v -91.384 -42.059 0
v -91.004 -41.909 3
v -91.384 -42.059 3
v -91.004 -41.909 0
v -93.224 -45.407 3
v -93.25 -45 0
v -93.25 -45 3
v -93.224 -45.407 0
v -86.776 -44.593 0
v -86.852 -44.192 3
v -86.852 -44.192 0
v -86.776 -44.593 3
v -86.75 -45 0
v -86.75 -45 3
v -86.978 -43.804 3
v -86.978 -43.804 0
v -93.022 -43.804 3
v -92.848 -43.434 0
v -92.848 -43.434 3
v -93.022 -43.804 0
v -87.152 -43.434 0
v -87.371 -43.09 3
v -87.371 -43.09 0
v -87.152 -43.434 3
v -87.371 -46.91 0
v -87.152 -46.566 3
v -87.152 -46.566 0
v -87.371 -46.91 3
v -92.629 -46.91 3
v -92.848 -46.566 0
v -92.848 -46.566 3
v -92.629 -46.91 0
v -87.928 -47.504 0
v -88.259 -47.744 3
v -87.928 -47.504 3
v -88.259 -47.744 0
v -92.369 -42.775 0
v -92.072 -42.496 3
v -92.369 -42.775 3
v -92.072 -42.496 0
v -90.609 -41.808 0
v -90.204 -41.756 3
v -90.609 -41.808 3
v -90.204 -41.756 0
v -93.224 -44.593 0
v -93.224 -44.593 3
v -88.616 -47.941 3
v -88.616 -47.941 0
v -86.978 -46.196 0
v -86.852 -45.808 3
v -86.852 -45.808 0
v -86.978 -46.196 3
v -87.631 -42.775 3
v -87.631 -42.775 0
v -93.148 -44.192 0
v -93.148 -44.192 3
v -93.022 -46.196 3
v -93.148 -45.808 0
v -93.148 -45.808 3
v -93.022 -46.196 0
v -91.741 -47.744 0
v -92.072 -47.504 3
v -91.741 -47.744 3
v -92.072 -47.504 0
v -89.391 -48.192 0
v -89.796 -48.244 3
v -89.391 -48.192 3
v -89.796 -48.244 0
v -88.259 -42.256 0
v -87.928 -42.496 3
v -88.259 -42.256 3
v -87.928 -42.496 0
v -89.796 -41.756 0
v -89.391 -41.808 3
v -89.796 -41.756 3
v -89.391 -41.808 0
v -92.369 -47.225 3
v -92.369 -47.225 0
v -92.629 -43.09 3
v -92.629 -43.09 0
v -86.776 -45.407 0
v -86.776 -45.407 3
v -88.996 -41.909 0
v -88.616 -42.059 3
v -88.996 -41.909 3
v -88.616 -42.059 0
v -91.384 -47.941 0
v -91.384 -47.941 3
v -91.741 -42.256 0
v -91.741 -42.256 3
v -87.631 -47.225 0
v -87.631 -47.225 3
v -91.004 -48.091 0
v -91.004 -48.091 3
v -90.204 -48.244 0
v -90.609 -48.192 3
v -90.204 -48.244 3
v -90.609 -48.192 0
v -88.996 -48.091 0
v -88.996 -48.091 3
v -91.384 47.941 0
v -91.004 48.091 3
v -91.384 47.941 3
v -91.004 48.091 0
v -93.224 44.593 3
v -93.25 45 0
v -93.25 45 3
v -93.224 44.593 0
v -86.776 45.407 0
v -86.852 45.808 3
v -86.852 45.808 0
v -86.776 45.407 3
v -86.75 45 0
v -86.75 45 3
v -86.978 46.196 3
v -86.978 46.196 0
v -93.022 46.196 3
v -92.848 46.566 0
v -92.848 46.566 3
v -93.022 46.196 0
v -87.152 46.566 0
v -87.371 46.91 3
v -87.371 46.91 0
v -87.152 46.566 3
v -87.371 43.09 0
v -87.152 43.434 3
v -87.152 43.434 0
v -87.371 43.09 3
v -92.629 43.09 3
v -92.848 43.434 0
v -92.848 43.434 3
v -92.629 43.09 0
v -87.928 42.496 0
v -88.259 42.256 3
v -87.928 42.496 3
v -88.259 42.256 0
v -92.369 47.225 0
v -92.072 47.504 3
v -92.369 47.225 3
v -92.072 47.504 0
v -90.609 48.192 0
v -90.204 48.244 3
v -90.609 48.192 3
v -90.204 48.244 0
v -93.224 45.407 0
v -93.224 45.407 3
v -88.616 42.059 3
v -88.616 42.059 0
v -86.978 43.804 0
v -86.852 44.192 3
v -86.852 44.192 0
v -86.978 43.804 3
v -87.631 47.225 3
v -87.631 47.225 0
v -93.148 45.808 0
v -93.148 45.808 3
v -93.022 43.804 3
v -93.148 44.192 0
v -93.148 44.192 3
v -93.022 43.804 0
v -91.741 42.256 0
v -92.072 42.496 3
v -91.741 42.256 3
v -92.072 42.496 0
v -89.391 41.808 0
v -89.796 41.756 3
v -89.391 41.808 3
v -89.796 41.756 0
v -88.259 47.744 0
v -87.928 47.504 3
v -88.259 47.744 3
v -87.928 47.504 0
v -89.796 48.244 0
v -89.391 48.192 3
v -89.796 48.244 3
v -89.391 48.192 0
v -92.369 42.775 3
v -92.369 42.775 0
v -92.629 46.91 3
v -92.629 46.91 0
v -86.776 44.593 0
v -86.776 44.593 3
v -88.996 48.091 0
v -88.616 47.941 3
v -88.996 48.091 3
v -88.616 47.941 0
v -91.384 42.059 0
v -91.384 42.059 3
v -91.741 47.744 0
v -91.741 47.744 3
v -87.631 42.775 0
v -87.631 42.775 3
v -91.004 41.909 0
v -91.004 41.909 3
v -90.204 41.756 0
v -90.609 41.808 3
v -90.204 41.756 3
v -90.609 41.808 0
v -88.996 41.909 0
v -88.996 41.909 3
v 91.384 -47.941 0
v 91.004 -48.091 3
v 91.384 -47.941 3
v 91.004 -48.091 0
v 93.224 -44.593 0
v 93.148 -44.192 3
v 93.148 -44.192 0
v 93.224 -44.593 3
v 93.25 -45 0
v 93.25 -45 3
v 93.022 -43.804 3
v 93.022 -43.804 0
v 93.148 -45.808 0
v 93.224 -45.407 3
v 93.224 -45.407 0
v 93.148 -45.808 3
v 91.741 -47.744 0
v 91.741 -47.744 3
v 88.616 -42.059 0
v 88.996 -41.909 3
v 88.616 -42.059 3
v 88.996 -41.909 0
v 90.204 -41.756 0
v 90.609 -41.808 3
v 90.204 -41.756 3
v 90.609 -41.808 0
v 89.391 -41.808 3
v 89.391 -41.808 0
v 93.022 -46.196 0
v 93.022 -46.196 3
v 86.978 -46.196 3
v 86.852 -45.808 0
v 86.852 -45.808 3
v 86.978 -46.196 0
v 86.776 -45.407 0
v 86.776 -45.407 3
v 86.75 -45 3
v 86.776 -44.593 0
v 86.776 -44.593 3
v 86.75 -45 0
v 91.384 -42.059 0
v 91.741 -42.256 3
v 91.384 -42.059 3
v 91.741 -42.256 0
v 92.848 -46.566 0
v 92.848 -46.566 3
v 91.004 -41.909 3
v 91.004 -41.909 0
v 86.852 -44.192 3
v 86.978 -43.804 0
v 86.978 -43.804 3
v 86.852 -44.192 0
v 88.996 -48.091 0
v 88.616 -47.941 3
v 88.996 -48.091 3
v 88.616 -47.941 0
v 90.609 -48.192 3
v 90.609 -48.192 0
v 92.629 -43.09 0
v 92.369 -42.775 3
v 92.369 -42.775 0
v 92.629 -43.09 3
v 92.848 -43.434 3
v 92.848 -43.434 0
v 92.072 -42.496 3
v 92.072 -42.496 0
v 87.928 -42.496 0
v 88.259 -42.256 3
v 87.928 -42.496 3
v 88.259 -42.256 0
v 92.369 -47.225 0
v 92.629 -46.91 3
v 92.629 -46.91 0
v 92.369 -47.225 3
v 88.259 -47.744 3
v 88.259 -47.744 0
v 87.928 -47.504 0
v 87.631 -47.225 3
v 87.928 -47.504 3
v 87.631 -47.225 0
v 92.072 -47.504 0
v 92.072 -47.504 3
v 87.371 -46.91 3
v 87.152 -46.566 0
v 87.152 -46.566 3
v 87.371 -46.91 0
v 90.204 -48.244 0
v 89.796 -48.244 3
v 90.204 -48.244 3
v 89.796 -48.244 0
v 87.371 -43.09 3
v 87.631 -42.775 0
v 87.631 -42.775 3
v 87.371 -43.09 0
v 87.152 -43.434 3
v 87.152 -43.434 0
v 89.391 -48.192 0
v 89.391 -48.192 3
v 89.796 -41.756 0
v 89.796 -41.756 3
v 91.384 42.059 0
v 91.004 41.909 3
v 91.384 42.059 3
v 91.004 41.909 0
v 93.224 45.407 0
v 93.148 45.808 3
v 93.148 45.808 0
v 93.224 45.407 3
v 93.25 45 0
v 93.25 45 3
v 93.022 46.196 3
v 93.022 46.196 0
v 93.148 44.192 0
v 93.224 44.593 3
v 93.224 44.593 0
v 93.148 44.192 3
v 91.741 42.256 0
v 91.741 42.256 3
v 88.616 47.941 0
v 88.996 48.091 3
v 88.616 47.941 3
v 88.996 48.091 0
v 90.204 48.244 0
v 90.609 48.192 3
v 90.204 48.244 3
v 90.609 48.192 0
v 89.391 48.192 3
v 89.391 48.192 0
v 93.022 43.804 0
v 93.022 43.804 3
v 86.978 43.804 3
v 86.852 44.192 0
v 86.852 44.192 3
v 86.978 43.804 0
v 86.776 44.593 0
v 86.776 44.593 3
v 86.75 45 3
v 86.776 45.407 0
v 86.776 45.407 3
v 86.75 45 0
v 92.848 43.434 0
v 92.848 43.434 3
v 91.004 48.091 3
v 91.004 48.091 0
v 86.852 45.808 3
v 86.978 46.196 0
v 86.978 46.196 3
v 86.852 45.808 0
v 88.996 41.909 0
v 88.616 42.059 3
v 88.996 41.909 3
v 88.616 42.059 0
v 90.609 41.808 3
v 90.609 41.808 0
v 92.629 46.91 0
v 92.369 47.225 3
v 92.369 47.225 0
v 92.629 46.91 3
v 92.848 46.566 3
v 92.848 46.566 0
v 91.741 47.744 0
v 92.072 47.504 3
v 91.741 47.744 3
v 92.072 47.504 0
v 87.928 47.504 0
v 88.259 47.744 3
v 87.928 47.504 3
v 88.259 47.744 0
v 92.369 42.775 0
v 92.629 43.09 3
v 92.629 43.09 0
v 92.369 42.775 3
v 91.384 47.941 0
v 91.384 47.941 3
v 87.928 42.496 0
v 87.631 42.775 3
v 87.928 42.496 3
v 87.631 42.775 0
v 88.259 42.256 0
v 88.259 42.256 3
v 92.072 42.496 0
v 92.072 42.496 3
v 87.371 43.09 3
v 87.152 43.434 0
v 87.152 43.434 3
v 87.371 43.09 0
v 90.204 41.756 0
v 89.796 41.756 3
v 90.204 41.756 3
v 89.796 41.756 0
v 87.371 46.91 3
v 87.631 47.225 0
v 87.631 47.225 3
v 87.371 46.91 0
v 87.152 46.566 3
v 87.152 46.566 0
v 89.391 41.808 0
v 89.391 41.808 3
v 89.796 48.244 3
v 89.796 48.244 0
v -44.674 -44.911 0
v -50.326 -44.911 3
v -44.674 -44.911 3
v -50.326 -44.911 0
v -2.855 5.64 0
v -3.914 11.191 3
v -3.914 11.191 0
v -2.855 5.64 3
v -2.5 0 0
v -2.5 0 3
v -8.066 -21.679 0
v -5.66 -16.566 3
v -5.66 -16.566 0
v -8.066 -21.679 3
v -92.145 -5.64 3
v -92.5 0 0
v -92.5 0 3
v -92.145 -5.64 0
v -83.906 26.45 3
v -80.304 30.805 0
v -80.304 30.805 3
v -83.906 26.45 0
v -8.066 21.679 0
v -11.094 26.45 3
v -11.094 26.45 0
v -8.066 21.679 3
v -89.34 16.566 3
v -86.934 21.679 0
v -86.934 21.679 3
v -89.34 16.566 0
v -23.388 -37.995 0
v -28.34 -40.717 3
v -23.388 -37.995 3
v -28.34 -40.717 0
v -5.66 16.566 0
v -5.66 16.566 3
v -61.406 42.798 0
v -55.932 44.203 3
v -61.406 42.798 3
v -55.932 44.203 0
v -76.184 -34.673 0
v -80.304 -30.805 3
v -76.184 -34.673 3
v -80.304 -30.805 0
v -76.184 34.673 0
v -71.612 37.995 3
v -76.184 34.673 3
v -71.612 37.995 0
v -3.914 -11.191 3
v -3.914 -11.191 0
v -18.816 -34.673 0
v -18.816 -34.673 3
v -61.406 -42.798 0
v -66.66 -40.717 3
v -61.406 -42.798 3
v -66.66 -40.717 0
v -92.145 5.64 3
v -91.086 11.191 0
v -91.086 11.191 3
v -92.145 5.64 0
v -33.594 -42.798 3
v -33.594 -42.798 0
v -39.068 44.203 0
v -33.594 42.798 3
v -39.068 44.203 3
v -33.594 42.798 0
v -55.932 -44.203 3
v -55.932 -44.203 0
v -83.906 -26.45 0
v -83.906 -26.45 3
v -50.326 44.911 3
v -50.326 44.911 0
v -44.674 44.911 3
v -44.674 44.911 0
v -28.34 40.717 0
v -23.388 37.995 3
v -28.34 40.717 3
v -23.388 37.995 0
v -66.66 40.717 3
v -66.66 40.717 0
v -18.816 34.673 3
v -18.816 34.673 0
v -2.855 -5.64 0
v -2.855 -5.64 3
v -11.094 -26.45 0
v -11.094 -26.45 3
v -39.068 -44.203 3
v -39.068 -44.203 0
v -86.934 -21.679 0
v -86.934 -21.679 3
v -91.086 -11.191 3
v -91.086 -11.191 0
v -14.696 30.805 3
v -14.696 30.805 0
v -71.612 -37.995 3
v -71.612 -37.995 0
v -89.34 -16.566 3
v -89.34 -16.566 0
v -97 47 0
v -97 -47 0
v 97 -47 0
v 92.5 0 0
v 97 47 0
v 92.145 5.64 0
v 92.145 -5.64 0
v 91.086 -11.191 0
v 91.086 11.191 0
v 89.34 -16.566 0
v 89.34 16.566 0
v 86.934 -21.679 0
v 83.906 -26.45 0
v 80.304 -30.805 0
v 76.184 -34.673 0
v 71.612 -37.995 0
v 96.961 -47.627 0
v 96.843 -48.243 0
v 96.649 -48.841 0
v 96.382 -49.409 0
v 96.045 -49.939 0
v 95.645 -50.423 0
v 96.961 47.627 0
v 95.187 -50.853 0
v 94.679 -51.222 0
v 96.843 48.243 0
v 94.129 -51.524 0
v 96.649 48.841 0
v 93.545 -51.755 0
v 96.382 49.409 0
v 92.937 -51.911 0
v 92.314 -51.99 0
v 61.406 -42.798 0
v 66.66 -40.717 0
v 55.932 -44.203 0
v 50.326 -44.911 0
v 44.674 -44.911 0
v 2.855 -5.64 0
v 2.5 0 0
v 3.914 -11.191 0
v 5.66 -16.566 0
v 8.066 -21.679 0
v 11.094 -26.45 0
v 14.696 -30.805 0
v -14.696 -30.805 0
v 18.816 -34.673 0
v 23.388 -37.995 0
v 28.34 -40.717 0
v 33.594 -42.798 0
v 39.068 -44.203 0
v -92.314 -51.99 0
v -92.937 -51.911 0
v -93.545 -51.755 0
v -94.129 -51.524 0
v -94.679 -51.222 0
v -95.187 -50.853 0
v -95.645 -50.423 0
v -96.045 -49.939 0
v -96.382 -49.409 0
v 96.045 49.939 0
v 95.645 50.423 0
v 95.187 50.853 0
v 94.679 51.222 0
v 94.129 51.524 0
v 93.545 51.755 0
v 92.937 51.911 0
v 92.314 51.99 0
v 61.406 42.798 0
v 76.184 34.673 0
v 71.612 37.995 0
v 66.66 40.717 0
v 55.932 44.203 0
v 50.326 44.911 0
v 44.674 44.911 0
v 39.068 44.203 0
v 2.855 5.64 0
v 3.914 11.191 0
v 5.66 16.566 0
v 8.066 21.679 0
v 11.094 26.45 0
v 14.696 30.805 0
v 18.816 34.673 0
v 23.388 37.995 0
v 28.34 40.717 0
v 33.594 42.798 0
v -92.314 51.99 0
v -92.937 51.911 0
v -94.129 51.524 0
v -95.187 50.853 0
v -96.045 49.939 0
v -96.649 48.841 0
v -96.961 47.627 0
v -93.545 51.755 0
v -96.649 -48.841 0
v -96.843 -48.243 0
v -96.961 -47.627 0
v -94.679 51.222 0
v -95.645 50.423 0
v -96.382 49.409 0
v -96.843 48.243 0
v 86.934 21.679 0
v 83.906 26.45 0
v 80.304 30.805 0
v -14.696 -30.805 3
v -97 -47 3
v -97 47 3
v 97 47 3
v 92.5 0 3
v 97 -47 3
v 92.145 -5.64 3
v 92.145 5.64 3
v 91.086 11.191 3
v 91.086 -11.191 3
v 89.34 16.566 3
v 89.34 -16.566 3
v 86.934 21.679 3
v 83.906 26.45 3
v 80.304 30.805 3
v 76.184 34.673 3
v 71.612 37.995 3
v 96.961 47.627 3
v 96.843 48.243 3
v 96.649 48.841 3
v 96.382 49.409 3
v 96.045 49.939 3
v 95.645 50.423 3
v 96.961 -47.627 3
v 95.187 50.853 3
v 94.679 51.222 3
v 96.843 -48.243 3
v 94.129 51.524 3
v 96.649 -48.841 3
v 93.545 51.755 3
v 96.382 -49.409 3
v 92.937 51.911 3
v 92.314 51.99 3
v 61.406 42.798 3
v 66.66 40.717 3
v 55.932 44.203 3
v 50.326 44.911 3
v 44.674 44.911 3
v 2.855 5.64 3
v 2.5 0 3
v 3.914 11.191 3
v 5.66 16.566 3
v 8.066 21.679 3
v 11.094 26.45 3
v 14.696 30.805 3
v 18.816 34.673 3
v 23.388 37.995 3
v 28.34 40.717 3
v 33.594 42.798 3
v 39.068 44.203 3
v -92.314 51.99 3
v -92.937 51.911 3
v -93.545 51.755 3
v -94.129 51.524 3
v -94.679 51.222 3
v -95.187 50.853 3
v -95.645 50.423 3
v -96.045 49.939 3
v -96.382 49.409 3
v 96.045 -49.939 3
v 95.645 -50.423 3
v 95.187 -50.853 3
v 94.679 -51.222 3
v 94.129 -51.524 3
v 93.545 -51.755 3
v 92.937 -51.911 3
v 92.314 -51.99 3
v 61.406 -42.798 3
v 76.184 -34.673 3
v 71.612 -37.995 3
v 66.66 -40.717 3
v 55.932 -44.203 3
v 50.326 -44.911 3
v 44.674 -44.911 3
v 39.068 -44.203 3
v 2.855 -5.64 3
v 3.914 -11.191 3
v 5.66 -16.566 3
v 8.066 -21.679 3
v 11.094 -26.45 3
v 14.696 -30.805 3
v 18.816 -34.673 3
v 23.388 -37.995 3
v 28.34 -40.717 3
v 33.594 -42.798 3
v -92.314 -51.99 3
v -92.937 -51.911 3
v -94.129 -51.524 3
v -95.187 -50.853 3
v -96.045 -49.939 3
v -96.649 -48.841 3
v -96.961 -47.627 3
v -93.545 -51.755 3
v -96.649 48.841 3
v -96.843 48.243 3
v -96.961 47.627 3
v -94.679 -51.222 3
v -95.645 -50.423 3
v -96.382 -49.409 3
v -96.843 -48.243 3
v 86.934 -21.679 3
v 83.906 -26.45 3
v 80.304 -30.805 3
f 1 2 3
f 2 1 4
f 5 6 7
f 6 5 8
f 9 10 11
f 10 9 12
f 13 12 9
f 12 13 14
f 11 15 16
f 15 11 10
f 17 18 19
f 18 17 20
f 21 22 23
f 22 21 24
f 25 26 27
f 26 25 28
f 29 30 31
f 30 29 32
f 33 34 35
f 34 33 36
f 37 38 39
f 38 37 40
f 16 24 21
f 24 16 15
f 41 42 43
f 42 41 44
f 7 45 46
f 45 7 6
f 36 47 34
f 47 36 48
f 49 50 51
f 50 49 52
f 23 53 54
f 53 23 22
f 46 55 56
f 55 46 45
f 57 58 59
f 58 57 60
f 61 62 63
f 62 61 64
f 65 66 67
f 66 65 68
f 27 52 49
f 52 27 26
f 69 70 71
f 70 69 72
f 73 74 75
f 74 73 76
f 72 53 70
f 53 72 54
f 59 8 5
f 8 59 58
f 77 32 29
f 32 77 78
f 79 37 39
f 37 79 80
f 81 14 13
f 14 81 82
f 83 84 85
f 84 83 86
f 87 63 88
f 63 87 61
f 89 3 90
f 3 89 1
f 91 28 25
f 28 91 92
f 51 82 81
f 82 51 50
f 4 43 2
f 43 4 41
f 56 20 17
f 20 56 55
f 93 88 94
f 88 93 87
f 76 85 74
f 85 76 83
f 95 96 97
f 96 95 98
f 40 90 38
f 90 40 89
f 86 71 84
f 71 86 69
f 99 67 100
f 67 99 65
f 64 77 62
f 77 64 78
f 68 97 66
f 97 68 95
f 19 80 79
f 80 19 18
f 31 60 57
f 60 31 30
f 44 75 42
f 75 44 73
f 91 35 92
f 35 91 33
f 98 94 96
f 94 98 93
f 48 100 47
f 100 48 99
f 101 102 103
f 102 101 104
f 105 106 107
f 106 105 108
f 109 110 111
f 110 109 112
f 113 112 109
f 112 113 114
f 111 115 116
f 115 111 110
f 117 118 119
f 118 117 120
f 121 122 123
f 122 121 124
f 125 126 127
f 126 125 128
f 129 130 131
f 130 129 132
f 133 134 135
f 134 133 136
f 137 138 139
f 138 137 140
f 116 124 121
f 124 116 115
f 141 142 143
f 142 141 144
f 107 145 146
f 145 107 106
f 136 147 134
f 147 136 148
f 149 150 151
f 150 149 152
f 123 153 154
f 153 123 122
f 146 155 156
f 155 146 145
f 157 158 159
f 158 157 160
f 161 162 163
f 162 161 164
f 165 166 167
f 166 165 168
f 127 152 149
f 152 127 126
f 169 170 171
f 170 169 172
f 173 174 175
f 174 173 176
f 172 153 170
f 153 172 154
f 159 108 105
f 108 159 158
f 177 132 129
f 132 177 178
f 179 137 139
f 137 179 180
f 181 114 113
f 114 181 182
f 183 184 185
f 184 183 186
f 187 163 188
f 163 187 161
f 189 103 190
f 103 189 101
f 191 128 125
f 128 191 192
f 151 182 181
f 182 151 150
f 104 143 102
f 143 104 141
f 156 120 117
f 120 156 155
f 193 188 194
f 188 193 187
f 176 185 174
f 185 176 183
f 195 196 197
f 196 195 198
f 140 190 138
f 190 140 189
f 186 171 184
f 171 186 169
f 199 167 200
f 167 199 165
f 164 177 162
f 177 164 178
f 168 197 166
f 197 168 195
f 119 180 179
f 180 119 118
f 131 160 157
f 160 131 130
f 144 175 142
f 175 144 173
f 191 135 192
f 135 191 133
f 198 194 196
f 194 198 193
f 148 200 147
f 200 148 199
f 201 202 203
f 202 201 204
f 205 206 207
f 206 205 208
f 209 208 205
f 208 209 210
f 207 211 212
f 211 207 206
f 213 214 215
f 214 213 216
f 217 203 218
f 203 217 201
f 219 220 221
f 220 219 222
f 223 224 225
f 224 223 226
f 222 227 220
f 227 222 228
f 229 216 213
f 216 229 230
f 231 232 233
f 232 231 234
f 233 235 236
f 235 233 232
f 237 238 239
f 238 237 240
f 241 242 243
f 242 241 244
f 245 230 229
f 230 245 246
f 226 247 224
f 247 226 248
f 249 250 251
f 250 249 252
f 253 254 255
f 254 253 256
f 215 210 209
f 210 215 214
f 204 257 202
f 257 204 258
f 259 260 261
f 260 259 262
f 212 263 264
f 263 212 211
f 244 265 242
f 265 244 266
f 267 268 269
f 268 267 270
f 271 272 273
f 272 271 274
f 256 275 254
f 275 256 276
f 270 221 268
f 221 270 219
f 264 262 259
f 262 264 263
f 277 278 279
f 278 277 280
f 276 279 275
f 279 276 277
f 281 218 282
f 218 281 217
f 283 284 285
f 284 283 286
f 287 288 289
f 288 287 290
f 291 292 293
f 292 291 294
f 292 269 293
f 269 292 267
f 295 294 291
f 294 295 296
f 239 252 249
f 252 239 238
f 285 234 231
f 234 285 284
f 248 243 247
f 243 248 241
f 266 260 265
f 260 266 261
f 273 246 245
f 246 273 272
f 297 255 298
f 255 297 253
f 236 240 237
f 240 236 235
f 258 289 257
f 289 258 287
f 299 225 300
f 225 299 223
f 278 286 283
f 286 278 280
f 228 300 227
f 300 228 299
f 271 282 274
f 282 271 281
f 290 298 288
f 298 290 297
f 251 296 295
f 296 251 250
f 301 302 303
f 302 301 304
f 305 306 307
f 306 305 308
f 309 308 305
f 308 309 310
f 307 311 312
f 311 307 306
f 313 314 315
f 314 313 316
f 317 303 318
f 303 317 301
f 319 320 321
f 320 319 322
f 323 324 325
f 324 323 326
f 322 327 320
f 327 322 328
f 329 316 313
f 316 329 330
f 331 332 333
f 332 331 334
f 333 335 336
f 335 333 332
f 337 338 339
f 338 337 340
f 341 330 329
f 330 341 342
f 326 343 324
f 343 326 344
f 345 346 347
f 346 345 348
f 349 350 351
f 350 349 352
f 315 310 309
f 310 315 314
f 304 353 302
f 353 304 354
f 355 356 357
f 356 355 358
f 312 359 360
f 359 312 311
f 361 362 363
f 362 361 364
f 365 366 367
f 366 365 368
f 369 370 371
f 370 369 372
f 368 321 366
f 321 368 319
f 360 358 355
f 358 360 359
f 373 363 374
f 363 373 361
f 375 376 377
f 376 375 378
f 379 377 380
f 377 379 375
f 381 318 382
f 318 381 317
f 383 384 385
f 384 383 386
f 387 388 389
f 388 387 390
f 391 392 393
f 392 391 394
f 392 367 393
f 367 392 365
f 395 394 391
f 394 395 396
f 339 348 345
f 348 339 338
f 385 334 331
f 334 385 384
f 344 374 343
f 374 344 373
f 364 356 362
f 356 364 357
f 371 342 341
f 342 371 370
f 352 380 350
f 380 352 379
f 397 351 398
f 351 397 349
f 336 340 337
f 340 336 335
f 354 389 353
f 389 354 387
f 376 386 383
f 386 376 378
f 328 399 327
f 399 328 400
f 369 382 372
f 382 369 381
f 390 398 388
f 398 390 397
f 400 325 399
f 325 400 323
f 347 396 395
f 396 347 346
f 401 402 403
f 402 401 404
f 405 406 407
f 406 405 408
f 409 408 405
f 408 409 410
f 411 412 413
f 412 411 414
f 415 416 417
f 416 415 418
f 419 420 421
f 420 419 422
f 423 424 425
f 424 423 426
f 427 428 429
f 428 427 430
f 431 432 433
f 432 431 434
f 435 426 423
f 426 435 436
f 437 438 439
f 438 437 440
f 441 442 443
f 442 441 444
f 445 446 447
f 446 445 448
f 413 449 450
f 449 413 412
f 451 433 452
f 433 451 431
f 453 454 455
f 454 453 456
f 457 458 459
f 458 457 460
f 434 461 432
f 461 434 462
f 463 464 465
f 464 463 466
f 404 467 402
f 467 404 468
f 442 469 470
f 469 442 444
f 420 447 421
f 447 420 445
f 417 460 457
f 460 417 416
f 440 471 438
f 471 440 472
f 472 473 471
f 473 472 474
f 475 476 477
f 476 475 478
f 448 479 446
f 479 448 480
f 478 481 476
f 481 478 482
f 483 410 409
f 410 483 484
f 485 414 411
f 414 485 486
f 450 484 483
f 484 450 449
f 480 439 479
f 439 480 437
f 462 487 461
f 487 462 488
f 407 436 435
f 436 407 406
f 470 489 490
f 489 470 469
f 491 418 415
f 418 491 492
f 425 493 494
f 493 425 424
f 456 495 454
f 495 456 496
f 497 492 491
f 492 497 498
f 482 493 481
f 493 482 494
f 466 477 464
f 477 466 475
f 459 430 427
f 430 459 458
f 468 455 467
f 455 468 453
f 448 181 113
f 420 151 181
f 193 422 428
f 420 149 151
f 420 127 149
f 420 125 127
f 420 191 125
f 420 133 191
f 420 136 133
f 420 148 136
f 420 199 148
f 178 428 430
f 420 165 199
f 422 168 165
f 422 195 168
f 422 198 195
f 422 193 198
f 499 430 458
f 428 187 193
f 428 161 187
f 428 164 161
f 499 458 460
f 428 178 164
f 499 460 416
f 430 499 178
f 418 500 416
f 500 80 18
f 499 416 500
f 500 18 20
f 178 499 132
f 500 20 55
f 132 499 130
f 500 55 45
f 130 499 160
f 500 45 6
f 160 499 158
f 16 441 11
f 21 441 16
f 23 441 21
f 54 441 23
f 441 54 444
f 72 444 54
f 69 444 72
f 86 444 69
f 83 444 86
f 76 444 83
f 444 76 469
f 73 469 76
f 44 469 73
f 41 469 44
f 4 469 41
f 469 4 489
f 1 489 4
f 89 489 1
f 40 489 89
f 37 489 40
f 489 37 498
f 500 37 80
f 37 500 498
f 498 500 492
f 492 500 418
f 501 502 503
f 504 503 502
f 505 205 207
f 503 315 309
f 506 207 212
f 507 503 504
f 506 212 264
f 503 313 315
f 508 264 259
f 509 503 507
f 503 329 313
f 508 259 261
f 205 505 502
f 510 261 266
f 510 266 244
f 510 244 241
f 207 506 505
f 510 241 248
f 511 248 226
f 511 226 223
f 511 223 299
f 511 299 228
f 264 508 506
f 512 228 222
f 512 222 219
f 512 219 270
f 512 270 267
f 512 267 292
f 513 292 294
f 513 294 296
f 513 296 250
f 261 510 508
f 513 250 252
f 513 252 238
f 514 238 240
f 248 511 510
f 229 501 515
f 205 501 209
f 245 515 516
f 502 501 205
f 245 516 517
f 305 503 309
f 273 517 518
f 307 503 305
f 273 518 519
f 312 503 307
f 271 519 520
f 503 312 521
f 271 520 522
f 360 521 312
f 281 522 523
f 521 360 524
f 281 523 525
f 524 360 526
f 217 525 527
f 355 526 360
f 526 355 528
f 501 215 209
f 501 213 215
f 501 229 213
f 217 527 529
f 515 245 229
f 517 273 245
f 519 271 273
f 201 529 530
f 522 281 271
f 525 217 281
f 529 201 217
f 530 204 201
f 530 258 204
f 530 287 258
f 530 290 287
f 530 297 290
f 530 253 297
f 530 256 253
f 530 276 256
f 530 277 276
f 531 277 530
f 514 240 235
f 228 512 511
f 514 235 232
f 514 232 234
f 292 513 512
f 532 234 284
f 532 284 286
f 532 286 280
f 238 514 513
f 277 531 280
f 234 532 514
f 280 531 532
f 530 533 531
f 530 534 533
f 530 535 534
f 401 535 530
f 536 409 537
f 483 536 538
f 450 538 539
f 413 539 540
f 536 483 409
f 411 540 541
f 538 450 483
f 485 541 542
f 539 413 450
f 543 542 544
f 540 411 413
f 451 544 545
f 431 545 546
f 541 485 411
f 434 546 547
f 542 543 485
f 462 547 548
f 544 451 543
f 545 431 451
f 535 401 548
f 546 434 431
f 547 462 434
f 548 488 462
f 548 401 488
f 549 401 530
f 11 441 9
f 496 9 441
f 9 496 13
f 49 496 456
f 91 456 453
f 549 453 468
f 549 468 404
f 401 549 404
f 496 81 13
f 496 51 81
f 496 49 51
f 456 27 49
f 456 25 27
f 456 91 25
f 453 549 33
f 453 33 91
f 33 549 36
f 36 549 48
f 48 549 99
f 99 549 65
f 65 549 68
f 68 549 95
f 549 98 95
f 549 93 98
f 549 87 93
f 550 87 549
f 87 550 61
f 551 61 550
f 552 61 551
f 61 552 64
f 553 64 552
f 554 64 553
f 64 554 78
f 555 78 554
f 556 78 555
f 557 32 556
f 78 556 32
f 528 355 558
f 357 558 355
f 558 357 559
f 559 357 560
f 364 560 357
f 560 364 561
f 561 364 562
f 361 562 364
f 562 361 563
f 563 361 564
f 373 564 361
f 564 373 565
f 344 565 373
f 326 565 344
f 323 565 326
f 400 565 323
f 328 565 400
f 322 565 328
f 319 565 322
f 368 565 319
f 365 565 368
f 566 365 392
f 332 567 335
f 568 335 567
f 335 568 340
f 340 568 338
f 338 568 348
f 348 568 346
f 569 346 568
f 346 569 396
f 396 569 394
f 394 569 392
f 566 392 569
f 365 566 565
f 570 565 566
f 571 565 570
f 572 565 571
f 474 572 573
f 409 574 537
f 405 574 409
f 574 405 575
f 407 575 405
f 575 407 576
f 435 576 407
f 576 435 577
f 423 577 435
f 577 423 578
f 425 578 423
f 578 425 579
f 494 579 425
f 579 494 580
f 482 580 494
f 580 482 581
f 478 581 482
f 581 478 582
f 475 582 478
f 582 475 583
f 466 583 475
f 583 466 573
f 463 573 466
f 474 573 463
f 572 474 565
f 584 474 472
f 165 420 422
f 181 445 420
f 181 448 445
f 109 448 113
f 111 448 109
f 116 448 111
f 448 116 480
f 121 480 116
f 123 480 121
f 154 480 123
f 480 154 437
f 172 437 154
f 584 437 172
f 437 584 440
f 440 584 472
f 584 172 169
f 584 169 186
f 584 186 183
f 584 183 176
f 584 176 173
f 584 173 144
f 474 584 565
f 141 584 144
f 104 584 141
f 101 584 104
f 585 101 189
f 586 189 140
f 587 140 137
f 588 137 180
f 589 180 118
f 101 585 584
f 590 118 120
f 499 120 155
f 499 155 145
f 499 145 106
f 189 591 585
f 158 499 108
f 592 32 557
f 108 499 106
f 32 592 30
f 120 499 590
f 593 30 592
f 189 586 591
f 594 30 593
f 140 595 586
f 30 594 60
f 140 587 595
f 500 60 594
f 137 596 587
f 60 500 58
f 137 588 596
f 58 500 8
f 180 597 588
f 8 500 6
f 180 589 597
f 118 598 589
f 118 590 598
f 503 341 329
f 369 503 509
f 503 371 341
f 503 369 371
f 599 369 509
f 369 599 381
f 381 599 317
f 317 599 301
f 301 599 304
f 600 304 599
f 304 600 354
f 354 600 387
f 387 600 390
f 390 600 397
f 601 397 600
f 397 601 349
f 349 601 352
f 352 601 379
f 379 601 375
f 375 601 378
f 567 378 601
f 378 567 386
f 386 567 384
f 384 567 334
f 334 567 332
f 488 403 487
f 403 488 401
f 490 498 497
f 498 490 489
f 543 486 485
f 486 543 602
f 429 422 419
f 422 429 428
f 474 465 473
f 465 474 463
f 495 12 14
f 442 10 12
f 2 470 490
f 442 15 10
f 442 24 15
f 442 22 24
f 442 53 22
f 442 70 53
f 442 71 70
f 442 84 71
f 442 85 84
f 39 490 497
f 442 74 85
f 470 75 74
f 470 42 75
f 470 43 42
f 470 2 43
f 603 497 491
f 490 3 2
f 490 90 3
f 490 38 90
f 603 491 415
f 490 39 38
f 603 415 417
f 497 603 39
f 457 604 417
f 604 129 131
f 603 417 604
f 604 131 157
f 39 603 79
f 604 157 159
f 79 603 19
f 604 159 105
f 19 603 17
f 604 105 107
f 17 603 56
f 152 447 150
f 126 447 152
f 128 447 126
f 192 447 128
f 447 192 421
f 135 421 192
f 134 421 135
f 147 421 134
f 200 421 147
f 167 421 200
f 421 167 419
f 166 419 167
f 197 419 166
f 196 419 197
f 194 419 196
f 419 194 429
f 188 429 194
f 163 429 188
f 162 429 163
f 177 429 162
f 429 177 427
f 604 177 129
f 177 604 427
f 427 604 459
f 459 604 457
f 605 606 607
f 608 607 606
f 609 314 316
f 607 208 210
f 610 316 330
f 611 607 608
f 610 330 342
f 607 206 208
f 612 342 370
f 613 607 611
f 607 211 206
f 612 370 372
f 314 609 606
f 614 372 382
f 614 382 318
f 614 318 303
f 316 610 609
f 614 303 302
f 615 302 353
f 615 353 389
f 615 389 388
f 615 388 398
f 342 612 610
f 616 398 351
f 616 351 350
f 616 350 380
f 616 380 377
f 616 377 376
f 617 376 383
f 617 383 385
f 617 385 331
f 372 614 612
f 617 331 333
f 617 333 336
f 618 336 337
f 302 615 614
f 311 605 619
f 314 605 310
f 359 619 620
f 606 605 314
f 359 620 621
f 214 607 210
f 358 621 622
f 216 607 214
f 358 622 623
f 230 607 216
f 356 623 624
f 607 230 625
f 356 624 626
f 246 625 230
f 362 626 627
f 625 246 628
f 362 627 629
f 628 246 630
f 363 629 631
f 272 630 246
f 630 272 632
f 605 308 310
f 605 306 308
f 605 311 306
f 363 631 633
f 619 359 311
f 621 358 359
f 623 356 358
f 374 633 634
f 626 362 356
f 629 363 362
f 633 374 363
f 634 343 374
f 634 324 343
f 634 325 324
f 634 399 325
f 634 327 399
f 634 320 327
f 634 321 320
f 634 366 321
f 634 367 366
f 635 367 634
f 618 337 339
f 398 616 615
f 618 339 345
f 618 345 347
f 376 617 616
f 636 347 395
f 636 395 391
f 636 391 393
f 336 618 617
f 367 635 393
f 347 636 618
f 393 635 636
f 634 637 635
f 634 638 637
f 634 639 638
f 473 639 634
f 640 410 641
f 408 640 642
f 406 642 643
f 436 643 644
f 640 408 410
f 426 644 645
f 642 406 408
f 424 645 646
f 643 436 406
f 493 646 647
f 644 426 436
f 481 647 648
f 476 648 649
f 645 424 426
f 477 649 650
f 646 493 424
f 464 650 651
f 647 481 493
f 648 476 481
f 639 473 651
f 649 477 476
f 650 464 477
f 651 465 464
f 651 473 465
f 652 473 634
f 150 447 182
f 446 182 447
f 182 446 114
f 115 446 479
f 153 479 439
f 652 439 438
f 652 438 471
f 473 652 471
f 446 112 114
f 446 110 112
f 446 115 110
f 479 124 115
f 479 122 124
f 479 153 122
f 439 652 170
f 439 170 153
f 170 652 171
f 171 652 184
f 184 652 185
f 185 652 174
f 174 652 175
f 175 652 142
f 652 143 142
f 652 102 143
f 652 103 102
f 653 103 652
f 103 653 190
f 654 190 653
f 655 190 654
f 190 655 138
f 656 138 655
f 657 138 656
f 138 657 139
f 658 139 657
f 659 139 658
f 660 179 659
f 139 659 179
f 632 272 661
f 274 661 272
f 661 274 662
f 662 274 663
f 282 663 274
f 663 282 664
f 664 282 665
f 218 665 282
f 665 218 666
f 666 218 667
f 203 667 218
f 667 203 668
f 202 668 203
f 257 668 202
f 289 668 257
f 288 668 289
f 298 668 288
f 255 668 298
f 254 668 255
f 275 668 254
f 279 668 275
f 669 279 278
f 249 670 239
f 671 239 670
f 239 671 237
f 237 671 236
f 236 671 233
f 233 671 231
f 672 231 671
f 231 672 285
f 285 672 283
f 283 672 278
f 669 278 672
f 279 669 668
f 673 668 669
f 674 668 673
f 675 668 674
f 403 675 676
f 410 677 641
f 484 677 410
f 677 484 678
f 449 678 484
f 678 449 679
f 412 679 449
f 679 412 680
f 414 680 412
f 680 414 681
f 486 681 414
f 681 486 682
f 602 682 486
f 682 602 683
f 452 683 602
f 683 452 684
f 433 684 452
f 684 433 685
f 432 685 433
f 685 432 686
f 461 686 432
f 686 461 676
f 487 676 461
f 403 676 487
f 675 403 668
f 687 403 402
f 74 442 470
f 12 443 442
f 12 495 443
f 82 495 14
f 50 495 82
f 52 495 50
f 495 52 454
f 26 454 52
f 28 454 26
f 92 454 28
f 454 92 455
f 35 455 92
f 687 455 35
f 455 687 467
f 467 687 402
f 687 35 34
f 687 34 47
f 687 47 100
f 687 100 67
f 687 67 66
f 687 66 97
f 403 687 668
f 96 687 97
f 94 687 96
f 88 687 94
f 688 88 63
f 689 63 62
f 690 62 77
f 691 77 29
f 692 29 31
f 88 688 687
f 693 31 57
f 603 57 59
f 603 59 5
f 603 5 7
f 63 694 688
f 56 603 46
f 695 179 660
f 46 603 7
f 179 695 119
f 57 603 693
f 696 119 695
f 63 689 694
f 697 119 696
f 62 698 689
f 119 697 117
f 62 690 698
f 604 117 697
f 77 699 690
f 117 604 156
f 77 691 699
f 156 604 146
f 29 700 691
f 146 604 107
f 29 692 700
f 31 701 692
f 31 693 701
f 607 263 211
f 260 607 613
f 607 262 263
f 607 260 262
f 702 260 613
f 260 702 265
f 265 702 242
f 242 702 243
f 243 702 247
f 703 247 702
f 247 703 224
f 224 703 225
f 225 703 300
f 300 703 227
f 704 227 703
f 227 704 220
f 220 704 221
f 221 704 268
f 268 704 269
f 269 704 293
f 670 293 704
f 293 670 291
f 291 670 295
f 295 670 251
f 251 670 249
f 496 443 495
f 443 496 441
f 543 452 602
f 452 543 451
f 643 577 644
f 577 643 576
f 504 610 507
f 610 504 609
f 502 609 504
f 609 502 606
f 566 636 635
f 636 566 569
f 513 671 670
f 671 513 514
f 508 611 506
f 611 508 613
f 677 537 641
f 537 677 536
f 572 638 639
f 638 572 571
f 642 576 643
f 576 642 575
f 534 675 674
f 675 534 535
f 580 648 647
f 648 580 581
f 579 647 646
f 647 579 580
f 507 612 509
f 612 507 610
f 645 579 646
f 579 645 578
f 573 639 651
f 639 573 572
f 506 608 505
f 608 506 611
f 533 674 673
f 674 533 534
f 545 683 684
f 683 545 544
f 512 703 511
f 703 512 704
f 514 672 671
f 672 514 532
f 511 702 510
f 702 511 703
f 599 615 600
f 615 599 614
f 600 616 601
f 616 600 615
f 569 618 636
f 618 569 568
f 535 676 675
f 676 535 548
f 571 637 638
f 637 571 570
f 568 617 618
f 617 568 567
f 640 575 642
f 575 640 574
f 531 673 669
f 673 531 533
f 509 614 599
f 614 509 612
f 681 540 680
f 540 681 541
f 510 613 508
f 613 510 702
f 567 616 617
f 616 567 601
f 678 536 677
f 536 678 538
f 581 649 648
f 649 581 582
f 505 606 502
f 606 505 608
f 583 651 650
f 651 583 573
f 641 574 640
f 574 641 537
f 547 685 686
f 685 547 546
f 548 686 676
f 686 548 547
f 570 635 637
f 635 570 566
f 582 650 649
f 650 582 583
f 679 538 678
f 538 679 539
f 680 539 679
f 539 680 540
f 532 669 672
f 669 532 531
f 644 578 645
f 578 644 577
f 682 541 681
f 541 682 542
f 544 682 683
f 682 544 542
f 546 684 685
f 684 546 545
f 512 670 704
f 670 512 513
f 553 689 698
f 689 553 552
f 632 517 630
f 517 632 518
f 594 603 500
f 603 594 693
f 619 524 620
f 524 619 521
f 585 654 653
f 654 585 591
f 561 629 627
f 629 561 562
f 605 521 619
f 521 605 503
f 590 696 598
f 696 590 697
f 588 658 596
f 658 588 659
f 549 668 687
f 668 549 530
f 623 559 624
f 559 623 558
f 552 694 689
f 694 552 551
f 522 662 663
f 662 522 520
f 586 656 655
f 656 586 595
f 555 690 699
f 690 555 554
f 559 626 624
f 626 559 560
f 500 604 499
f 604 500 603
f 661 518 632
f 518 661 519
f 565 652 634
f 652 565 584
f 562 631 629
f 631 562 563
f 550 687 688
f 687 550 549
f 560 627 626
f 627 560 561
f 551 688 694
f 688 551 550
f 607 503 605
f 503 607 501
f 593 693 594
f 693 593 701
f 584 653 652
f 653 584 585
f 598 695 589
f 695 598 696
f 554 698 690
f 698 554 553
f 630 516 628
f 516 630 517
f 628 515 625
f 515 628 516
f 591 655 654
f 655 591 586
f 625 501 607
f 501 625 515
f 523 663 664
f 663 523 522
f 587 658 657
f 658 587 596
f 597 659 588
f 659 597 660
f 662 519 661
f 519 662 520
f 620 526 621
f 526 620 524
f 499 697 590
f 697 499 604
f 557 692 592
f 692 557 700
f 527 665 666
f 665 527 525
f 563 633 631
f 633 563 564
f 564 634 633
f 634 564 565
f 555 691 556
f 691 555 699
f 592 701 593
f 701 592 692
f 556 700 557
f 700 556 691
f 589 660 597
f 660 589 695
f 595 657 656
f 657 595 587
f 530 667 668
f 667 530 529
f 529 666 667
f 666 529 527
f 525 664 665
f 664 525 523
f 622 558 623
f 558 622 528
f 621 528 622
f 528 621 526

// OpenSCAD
$fn = 50;


difference() {
	union() {
		hull() {
			translate(v = [-92.0000000000, 47.0000000000, 0]) {
				cylinder(h = 3, r = 5);
			}
			translate(v = [92.0000000000, 47.0000000000, 0]) {
				cylinder(h = 3, r = 5);
			}
			translate(v = [-92.0000000000, -47.0000000000, 0]) {
				cylinder(h = 3, r = 5);
			}
			translate(v = [92.0000000000, -47.0000000000, 0]) {
				cylinder(h = 3, r = 5);
			}
		}
	}
	union() {
		#translate(v = [-90.0000000000, -45.0000000000, -100.0000000000]) {
			cylinder(h = 200, r = 3.2500000000);
		}
		#translate(v = [-90.0000000000, 45.0000000000, -100.0000000000]) {
			cylinder(h = 200, r = 3.2500000000);
		}
		#translate(v = [90.0000000000, -45.0000000000, -100.0000000000]) {
			cylinder(h = 200, r = 3.2500000000);
		}
		#translate(v = [90.0000000000, 45.0000000000, -100.0000000000]) {
			cylinder(h = 200, r = 3.2500000000);
		}
		#translate(v = [-47.5000000000, 0, 0]) {
			cylinder(h = 3, r = 45.0000000000);
		}
		#translate(v = [47.5000000000, 0, 0]) {
			cylinder(h = 3, r = 45.0000000000);
		}
	}
}
